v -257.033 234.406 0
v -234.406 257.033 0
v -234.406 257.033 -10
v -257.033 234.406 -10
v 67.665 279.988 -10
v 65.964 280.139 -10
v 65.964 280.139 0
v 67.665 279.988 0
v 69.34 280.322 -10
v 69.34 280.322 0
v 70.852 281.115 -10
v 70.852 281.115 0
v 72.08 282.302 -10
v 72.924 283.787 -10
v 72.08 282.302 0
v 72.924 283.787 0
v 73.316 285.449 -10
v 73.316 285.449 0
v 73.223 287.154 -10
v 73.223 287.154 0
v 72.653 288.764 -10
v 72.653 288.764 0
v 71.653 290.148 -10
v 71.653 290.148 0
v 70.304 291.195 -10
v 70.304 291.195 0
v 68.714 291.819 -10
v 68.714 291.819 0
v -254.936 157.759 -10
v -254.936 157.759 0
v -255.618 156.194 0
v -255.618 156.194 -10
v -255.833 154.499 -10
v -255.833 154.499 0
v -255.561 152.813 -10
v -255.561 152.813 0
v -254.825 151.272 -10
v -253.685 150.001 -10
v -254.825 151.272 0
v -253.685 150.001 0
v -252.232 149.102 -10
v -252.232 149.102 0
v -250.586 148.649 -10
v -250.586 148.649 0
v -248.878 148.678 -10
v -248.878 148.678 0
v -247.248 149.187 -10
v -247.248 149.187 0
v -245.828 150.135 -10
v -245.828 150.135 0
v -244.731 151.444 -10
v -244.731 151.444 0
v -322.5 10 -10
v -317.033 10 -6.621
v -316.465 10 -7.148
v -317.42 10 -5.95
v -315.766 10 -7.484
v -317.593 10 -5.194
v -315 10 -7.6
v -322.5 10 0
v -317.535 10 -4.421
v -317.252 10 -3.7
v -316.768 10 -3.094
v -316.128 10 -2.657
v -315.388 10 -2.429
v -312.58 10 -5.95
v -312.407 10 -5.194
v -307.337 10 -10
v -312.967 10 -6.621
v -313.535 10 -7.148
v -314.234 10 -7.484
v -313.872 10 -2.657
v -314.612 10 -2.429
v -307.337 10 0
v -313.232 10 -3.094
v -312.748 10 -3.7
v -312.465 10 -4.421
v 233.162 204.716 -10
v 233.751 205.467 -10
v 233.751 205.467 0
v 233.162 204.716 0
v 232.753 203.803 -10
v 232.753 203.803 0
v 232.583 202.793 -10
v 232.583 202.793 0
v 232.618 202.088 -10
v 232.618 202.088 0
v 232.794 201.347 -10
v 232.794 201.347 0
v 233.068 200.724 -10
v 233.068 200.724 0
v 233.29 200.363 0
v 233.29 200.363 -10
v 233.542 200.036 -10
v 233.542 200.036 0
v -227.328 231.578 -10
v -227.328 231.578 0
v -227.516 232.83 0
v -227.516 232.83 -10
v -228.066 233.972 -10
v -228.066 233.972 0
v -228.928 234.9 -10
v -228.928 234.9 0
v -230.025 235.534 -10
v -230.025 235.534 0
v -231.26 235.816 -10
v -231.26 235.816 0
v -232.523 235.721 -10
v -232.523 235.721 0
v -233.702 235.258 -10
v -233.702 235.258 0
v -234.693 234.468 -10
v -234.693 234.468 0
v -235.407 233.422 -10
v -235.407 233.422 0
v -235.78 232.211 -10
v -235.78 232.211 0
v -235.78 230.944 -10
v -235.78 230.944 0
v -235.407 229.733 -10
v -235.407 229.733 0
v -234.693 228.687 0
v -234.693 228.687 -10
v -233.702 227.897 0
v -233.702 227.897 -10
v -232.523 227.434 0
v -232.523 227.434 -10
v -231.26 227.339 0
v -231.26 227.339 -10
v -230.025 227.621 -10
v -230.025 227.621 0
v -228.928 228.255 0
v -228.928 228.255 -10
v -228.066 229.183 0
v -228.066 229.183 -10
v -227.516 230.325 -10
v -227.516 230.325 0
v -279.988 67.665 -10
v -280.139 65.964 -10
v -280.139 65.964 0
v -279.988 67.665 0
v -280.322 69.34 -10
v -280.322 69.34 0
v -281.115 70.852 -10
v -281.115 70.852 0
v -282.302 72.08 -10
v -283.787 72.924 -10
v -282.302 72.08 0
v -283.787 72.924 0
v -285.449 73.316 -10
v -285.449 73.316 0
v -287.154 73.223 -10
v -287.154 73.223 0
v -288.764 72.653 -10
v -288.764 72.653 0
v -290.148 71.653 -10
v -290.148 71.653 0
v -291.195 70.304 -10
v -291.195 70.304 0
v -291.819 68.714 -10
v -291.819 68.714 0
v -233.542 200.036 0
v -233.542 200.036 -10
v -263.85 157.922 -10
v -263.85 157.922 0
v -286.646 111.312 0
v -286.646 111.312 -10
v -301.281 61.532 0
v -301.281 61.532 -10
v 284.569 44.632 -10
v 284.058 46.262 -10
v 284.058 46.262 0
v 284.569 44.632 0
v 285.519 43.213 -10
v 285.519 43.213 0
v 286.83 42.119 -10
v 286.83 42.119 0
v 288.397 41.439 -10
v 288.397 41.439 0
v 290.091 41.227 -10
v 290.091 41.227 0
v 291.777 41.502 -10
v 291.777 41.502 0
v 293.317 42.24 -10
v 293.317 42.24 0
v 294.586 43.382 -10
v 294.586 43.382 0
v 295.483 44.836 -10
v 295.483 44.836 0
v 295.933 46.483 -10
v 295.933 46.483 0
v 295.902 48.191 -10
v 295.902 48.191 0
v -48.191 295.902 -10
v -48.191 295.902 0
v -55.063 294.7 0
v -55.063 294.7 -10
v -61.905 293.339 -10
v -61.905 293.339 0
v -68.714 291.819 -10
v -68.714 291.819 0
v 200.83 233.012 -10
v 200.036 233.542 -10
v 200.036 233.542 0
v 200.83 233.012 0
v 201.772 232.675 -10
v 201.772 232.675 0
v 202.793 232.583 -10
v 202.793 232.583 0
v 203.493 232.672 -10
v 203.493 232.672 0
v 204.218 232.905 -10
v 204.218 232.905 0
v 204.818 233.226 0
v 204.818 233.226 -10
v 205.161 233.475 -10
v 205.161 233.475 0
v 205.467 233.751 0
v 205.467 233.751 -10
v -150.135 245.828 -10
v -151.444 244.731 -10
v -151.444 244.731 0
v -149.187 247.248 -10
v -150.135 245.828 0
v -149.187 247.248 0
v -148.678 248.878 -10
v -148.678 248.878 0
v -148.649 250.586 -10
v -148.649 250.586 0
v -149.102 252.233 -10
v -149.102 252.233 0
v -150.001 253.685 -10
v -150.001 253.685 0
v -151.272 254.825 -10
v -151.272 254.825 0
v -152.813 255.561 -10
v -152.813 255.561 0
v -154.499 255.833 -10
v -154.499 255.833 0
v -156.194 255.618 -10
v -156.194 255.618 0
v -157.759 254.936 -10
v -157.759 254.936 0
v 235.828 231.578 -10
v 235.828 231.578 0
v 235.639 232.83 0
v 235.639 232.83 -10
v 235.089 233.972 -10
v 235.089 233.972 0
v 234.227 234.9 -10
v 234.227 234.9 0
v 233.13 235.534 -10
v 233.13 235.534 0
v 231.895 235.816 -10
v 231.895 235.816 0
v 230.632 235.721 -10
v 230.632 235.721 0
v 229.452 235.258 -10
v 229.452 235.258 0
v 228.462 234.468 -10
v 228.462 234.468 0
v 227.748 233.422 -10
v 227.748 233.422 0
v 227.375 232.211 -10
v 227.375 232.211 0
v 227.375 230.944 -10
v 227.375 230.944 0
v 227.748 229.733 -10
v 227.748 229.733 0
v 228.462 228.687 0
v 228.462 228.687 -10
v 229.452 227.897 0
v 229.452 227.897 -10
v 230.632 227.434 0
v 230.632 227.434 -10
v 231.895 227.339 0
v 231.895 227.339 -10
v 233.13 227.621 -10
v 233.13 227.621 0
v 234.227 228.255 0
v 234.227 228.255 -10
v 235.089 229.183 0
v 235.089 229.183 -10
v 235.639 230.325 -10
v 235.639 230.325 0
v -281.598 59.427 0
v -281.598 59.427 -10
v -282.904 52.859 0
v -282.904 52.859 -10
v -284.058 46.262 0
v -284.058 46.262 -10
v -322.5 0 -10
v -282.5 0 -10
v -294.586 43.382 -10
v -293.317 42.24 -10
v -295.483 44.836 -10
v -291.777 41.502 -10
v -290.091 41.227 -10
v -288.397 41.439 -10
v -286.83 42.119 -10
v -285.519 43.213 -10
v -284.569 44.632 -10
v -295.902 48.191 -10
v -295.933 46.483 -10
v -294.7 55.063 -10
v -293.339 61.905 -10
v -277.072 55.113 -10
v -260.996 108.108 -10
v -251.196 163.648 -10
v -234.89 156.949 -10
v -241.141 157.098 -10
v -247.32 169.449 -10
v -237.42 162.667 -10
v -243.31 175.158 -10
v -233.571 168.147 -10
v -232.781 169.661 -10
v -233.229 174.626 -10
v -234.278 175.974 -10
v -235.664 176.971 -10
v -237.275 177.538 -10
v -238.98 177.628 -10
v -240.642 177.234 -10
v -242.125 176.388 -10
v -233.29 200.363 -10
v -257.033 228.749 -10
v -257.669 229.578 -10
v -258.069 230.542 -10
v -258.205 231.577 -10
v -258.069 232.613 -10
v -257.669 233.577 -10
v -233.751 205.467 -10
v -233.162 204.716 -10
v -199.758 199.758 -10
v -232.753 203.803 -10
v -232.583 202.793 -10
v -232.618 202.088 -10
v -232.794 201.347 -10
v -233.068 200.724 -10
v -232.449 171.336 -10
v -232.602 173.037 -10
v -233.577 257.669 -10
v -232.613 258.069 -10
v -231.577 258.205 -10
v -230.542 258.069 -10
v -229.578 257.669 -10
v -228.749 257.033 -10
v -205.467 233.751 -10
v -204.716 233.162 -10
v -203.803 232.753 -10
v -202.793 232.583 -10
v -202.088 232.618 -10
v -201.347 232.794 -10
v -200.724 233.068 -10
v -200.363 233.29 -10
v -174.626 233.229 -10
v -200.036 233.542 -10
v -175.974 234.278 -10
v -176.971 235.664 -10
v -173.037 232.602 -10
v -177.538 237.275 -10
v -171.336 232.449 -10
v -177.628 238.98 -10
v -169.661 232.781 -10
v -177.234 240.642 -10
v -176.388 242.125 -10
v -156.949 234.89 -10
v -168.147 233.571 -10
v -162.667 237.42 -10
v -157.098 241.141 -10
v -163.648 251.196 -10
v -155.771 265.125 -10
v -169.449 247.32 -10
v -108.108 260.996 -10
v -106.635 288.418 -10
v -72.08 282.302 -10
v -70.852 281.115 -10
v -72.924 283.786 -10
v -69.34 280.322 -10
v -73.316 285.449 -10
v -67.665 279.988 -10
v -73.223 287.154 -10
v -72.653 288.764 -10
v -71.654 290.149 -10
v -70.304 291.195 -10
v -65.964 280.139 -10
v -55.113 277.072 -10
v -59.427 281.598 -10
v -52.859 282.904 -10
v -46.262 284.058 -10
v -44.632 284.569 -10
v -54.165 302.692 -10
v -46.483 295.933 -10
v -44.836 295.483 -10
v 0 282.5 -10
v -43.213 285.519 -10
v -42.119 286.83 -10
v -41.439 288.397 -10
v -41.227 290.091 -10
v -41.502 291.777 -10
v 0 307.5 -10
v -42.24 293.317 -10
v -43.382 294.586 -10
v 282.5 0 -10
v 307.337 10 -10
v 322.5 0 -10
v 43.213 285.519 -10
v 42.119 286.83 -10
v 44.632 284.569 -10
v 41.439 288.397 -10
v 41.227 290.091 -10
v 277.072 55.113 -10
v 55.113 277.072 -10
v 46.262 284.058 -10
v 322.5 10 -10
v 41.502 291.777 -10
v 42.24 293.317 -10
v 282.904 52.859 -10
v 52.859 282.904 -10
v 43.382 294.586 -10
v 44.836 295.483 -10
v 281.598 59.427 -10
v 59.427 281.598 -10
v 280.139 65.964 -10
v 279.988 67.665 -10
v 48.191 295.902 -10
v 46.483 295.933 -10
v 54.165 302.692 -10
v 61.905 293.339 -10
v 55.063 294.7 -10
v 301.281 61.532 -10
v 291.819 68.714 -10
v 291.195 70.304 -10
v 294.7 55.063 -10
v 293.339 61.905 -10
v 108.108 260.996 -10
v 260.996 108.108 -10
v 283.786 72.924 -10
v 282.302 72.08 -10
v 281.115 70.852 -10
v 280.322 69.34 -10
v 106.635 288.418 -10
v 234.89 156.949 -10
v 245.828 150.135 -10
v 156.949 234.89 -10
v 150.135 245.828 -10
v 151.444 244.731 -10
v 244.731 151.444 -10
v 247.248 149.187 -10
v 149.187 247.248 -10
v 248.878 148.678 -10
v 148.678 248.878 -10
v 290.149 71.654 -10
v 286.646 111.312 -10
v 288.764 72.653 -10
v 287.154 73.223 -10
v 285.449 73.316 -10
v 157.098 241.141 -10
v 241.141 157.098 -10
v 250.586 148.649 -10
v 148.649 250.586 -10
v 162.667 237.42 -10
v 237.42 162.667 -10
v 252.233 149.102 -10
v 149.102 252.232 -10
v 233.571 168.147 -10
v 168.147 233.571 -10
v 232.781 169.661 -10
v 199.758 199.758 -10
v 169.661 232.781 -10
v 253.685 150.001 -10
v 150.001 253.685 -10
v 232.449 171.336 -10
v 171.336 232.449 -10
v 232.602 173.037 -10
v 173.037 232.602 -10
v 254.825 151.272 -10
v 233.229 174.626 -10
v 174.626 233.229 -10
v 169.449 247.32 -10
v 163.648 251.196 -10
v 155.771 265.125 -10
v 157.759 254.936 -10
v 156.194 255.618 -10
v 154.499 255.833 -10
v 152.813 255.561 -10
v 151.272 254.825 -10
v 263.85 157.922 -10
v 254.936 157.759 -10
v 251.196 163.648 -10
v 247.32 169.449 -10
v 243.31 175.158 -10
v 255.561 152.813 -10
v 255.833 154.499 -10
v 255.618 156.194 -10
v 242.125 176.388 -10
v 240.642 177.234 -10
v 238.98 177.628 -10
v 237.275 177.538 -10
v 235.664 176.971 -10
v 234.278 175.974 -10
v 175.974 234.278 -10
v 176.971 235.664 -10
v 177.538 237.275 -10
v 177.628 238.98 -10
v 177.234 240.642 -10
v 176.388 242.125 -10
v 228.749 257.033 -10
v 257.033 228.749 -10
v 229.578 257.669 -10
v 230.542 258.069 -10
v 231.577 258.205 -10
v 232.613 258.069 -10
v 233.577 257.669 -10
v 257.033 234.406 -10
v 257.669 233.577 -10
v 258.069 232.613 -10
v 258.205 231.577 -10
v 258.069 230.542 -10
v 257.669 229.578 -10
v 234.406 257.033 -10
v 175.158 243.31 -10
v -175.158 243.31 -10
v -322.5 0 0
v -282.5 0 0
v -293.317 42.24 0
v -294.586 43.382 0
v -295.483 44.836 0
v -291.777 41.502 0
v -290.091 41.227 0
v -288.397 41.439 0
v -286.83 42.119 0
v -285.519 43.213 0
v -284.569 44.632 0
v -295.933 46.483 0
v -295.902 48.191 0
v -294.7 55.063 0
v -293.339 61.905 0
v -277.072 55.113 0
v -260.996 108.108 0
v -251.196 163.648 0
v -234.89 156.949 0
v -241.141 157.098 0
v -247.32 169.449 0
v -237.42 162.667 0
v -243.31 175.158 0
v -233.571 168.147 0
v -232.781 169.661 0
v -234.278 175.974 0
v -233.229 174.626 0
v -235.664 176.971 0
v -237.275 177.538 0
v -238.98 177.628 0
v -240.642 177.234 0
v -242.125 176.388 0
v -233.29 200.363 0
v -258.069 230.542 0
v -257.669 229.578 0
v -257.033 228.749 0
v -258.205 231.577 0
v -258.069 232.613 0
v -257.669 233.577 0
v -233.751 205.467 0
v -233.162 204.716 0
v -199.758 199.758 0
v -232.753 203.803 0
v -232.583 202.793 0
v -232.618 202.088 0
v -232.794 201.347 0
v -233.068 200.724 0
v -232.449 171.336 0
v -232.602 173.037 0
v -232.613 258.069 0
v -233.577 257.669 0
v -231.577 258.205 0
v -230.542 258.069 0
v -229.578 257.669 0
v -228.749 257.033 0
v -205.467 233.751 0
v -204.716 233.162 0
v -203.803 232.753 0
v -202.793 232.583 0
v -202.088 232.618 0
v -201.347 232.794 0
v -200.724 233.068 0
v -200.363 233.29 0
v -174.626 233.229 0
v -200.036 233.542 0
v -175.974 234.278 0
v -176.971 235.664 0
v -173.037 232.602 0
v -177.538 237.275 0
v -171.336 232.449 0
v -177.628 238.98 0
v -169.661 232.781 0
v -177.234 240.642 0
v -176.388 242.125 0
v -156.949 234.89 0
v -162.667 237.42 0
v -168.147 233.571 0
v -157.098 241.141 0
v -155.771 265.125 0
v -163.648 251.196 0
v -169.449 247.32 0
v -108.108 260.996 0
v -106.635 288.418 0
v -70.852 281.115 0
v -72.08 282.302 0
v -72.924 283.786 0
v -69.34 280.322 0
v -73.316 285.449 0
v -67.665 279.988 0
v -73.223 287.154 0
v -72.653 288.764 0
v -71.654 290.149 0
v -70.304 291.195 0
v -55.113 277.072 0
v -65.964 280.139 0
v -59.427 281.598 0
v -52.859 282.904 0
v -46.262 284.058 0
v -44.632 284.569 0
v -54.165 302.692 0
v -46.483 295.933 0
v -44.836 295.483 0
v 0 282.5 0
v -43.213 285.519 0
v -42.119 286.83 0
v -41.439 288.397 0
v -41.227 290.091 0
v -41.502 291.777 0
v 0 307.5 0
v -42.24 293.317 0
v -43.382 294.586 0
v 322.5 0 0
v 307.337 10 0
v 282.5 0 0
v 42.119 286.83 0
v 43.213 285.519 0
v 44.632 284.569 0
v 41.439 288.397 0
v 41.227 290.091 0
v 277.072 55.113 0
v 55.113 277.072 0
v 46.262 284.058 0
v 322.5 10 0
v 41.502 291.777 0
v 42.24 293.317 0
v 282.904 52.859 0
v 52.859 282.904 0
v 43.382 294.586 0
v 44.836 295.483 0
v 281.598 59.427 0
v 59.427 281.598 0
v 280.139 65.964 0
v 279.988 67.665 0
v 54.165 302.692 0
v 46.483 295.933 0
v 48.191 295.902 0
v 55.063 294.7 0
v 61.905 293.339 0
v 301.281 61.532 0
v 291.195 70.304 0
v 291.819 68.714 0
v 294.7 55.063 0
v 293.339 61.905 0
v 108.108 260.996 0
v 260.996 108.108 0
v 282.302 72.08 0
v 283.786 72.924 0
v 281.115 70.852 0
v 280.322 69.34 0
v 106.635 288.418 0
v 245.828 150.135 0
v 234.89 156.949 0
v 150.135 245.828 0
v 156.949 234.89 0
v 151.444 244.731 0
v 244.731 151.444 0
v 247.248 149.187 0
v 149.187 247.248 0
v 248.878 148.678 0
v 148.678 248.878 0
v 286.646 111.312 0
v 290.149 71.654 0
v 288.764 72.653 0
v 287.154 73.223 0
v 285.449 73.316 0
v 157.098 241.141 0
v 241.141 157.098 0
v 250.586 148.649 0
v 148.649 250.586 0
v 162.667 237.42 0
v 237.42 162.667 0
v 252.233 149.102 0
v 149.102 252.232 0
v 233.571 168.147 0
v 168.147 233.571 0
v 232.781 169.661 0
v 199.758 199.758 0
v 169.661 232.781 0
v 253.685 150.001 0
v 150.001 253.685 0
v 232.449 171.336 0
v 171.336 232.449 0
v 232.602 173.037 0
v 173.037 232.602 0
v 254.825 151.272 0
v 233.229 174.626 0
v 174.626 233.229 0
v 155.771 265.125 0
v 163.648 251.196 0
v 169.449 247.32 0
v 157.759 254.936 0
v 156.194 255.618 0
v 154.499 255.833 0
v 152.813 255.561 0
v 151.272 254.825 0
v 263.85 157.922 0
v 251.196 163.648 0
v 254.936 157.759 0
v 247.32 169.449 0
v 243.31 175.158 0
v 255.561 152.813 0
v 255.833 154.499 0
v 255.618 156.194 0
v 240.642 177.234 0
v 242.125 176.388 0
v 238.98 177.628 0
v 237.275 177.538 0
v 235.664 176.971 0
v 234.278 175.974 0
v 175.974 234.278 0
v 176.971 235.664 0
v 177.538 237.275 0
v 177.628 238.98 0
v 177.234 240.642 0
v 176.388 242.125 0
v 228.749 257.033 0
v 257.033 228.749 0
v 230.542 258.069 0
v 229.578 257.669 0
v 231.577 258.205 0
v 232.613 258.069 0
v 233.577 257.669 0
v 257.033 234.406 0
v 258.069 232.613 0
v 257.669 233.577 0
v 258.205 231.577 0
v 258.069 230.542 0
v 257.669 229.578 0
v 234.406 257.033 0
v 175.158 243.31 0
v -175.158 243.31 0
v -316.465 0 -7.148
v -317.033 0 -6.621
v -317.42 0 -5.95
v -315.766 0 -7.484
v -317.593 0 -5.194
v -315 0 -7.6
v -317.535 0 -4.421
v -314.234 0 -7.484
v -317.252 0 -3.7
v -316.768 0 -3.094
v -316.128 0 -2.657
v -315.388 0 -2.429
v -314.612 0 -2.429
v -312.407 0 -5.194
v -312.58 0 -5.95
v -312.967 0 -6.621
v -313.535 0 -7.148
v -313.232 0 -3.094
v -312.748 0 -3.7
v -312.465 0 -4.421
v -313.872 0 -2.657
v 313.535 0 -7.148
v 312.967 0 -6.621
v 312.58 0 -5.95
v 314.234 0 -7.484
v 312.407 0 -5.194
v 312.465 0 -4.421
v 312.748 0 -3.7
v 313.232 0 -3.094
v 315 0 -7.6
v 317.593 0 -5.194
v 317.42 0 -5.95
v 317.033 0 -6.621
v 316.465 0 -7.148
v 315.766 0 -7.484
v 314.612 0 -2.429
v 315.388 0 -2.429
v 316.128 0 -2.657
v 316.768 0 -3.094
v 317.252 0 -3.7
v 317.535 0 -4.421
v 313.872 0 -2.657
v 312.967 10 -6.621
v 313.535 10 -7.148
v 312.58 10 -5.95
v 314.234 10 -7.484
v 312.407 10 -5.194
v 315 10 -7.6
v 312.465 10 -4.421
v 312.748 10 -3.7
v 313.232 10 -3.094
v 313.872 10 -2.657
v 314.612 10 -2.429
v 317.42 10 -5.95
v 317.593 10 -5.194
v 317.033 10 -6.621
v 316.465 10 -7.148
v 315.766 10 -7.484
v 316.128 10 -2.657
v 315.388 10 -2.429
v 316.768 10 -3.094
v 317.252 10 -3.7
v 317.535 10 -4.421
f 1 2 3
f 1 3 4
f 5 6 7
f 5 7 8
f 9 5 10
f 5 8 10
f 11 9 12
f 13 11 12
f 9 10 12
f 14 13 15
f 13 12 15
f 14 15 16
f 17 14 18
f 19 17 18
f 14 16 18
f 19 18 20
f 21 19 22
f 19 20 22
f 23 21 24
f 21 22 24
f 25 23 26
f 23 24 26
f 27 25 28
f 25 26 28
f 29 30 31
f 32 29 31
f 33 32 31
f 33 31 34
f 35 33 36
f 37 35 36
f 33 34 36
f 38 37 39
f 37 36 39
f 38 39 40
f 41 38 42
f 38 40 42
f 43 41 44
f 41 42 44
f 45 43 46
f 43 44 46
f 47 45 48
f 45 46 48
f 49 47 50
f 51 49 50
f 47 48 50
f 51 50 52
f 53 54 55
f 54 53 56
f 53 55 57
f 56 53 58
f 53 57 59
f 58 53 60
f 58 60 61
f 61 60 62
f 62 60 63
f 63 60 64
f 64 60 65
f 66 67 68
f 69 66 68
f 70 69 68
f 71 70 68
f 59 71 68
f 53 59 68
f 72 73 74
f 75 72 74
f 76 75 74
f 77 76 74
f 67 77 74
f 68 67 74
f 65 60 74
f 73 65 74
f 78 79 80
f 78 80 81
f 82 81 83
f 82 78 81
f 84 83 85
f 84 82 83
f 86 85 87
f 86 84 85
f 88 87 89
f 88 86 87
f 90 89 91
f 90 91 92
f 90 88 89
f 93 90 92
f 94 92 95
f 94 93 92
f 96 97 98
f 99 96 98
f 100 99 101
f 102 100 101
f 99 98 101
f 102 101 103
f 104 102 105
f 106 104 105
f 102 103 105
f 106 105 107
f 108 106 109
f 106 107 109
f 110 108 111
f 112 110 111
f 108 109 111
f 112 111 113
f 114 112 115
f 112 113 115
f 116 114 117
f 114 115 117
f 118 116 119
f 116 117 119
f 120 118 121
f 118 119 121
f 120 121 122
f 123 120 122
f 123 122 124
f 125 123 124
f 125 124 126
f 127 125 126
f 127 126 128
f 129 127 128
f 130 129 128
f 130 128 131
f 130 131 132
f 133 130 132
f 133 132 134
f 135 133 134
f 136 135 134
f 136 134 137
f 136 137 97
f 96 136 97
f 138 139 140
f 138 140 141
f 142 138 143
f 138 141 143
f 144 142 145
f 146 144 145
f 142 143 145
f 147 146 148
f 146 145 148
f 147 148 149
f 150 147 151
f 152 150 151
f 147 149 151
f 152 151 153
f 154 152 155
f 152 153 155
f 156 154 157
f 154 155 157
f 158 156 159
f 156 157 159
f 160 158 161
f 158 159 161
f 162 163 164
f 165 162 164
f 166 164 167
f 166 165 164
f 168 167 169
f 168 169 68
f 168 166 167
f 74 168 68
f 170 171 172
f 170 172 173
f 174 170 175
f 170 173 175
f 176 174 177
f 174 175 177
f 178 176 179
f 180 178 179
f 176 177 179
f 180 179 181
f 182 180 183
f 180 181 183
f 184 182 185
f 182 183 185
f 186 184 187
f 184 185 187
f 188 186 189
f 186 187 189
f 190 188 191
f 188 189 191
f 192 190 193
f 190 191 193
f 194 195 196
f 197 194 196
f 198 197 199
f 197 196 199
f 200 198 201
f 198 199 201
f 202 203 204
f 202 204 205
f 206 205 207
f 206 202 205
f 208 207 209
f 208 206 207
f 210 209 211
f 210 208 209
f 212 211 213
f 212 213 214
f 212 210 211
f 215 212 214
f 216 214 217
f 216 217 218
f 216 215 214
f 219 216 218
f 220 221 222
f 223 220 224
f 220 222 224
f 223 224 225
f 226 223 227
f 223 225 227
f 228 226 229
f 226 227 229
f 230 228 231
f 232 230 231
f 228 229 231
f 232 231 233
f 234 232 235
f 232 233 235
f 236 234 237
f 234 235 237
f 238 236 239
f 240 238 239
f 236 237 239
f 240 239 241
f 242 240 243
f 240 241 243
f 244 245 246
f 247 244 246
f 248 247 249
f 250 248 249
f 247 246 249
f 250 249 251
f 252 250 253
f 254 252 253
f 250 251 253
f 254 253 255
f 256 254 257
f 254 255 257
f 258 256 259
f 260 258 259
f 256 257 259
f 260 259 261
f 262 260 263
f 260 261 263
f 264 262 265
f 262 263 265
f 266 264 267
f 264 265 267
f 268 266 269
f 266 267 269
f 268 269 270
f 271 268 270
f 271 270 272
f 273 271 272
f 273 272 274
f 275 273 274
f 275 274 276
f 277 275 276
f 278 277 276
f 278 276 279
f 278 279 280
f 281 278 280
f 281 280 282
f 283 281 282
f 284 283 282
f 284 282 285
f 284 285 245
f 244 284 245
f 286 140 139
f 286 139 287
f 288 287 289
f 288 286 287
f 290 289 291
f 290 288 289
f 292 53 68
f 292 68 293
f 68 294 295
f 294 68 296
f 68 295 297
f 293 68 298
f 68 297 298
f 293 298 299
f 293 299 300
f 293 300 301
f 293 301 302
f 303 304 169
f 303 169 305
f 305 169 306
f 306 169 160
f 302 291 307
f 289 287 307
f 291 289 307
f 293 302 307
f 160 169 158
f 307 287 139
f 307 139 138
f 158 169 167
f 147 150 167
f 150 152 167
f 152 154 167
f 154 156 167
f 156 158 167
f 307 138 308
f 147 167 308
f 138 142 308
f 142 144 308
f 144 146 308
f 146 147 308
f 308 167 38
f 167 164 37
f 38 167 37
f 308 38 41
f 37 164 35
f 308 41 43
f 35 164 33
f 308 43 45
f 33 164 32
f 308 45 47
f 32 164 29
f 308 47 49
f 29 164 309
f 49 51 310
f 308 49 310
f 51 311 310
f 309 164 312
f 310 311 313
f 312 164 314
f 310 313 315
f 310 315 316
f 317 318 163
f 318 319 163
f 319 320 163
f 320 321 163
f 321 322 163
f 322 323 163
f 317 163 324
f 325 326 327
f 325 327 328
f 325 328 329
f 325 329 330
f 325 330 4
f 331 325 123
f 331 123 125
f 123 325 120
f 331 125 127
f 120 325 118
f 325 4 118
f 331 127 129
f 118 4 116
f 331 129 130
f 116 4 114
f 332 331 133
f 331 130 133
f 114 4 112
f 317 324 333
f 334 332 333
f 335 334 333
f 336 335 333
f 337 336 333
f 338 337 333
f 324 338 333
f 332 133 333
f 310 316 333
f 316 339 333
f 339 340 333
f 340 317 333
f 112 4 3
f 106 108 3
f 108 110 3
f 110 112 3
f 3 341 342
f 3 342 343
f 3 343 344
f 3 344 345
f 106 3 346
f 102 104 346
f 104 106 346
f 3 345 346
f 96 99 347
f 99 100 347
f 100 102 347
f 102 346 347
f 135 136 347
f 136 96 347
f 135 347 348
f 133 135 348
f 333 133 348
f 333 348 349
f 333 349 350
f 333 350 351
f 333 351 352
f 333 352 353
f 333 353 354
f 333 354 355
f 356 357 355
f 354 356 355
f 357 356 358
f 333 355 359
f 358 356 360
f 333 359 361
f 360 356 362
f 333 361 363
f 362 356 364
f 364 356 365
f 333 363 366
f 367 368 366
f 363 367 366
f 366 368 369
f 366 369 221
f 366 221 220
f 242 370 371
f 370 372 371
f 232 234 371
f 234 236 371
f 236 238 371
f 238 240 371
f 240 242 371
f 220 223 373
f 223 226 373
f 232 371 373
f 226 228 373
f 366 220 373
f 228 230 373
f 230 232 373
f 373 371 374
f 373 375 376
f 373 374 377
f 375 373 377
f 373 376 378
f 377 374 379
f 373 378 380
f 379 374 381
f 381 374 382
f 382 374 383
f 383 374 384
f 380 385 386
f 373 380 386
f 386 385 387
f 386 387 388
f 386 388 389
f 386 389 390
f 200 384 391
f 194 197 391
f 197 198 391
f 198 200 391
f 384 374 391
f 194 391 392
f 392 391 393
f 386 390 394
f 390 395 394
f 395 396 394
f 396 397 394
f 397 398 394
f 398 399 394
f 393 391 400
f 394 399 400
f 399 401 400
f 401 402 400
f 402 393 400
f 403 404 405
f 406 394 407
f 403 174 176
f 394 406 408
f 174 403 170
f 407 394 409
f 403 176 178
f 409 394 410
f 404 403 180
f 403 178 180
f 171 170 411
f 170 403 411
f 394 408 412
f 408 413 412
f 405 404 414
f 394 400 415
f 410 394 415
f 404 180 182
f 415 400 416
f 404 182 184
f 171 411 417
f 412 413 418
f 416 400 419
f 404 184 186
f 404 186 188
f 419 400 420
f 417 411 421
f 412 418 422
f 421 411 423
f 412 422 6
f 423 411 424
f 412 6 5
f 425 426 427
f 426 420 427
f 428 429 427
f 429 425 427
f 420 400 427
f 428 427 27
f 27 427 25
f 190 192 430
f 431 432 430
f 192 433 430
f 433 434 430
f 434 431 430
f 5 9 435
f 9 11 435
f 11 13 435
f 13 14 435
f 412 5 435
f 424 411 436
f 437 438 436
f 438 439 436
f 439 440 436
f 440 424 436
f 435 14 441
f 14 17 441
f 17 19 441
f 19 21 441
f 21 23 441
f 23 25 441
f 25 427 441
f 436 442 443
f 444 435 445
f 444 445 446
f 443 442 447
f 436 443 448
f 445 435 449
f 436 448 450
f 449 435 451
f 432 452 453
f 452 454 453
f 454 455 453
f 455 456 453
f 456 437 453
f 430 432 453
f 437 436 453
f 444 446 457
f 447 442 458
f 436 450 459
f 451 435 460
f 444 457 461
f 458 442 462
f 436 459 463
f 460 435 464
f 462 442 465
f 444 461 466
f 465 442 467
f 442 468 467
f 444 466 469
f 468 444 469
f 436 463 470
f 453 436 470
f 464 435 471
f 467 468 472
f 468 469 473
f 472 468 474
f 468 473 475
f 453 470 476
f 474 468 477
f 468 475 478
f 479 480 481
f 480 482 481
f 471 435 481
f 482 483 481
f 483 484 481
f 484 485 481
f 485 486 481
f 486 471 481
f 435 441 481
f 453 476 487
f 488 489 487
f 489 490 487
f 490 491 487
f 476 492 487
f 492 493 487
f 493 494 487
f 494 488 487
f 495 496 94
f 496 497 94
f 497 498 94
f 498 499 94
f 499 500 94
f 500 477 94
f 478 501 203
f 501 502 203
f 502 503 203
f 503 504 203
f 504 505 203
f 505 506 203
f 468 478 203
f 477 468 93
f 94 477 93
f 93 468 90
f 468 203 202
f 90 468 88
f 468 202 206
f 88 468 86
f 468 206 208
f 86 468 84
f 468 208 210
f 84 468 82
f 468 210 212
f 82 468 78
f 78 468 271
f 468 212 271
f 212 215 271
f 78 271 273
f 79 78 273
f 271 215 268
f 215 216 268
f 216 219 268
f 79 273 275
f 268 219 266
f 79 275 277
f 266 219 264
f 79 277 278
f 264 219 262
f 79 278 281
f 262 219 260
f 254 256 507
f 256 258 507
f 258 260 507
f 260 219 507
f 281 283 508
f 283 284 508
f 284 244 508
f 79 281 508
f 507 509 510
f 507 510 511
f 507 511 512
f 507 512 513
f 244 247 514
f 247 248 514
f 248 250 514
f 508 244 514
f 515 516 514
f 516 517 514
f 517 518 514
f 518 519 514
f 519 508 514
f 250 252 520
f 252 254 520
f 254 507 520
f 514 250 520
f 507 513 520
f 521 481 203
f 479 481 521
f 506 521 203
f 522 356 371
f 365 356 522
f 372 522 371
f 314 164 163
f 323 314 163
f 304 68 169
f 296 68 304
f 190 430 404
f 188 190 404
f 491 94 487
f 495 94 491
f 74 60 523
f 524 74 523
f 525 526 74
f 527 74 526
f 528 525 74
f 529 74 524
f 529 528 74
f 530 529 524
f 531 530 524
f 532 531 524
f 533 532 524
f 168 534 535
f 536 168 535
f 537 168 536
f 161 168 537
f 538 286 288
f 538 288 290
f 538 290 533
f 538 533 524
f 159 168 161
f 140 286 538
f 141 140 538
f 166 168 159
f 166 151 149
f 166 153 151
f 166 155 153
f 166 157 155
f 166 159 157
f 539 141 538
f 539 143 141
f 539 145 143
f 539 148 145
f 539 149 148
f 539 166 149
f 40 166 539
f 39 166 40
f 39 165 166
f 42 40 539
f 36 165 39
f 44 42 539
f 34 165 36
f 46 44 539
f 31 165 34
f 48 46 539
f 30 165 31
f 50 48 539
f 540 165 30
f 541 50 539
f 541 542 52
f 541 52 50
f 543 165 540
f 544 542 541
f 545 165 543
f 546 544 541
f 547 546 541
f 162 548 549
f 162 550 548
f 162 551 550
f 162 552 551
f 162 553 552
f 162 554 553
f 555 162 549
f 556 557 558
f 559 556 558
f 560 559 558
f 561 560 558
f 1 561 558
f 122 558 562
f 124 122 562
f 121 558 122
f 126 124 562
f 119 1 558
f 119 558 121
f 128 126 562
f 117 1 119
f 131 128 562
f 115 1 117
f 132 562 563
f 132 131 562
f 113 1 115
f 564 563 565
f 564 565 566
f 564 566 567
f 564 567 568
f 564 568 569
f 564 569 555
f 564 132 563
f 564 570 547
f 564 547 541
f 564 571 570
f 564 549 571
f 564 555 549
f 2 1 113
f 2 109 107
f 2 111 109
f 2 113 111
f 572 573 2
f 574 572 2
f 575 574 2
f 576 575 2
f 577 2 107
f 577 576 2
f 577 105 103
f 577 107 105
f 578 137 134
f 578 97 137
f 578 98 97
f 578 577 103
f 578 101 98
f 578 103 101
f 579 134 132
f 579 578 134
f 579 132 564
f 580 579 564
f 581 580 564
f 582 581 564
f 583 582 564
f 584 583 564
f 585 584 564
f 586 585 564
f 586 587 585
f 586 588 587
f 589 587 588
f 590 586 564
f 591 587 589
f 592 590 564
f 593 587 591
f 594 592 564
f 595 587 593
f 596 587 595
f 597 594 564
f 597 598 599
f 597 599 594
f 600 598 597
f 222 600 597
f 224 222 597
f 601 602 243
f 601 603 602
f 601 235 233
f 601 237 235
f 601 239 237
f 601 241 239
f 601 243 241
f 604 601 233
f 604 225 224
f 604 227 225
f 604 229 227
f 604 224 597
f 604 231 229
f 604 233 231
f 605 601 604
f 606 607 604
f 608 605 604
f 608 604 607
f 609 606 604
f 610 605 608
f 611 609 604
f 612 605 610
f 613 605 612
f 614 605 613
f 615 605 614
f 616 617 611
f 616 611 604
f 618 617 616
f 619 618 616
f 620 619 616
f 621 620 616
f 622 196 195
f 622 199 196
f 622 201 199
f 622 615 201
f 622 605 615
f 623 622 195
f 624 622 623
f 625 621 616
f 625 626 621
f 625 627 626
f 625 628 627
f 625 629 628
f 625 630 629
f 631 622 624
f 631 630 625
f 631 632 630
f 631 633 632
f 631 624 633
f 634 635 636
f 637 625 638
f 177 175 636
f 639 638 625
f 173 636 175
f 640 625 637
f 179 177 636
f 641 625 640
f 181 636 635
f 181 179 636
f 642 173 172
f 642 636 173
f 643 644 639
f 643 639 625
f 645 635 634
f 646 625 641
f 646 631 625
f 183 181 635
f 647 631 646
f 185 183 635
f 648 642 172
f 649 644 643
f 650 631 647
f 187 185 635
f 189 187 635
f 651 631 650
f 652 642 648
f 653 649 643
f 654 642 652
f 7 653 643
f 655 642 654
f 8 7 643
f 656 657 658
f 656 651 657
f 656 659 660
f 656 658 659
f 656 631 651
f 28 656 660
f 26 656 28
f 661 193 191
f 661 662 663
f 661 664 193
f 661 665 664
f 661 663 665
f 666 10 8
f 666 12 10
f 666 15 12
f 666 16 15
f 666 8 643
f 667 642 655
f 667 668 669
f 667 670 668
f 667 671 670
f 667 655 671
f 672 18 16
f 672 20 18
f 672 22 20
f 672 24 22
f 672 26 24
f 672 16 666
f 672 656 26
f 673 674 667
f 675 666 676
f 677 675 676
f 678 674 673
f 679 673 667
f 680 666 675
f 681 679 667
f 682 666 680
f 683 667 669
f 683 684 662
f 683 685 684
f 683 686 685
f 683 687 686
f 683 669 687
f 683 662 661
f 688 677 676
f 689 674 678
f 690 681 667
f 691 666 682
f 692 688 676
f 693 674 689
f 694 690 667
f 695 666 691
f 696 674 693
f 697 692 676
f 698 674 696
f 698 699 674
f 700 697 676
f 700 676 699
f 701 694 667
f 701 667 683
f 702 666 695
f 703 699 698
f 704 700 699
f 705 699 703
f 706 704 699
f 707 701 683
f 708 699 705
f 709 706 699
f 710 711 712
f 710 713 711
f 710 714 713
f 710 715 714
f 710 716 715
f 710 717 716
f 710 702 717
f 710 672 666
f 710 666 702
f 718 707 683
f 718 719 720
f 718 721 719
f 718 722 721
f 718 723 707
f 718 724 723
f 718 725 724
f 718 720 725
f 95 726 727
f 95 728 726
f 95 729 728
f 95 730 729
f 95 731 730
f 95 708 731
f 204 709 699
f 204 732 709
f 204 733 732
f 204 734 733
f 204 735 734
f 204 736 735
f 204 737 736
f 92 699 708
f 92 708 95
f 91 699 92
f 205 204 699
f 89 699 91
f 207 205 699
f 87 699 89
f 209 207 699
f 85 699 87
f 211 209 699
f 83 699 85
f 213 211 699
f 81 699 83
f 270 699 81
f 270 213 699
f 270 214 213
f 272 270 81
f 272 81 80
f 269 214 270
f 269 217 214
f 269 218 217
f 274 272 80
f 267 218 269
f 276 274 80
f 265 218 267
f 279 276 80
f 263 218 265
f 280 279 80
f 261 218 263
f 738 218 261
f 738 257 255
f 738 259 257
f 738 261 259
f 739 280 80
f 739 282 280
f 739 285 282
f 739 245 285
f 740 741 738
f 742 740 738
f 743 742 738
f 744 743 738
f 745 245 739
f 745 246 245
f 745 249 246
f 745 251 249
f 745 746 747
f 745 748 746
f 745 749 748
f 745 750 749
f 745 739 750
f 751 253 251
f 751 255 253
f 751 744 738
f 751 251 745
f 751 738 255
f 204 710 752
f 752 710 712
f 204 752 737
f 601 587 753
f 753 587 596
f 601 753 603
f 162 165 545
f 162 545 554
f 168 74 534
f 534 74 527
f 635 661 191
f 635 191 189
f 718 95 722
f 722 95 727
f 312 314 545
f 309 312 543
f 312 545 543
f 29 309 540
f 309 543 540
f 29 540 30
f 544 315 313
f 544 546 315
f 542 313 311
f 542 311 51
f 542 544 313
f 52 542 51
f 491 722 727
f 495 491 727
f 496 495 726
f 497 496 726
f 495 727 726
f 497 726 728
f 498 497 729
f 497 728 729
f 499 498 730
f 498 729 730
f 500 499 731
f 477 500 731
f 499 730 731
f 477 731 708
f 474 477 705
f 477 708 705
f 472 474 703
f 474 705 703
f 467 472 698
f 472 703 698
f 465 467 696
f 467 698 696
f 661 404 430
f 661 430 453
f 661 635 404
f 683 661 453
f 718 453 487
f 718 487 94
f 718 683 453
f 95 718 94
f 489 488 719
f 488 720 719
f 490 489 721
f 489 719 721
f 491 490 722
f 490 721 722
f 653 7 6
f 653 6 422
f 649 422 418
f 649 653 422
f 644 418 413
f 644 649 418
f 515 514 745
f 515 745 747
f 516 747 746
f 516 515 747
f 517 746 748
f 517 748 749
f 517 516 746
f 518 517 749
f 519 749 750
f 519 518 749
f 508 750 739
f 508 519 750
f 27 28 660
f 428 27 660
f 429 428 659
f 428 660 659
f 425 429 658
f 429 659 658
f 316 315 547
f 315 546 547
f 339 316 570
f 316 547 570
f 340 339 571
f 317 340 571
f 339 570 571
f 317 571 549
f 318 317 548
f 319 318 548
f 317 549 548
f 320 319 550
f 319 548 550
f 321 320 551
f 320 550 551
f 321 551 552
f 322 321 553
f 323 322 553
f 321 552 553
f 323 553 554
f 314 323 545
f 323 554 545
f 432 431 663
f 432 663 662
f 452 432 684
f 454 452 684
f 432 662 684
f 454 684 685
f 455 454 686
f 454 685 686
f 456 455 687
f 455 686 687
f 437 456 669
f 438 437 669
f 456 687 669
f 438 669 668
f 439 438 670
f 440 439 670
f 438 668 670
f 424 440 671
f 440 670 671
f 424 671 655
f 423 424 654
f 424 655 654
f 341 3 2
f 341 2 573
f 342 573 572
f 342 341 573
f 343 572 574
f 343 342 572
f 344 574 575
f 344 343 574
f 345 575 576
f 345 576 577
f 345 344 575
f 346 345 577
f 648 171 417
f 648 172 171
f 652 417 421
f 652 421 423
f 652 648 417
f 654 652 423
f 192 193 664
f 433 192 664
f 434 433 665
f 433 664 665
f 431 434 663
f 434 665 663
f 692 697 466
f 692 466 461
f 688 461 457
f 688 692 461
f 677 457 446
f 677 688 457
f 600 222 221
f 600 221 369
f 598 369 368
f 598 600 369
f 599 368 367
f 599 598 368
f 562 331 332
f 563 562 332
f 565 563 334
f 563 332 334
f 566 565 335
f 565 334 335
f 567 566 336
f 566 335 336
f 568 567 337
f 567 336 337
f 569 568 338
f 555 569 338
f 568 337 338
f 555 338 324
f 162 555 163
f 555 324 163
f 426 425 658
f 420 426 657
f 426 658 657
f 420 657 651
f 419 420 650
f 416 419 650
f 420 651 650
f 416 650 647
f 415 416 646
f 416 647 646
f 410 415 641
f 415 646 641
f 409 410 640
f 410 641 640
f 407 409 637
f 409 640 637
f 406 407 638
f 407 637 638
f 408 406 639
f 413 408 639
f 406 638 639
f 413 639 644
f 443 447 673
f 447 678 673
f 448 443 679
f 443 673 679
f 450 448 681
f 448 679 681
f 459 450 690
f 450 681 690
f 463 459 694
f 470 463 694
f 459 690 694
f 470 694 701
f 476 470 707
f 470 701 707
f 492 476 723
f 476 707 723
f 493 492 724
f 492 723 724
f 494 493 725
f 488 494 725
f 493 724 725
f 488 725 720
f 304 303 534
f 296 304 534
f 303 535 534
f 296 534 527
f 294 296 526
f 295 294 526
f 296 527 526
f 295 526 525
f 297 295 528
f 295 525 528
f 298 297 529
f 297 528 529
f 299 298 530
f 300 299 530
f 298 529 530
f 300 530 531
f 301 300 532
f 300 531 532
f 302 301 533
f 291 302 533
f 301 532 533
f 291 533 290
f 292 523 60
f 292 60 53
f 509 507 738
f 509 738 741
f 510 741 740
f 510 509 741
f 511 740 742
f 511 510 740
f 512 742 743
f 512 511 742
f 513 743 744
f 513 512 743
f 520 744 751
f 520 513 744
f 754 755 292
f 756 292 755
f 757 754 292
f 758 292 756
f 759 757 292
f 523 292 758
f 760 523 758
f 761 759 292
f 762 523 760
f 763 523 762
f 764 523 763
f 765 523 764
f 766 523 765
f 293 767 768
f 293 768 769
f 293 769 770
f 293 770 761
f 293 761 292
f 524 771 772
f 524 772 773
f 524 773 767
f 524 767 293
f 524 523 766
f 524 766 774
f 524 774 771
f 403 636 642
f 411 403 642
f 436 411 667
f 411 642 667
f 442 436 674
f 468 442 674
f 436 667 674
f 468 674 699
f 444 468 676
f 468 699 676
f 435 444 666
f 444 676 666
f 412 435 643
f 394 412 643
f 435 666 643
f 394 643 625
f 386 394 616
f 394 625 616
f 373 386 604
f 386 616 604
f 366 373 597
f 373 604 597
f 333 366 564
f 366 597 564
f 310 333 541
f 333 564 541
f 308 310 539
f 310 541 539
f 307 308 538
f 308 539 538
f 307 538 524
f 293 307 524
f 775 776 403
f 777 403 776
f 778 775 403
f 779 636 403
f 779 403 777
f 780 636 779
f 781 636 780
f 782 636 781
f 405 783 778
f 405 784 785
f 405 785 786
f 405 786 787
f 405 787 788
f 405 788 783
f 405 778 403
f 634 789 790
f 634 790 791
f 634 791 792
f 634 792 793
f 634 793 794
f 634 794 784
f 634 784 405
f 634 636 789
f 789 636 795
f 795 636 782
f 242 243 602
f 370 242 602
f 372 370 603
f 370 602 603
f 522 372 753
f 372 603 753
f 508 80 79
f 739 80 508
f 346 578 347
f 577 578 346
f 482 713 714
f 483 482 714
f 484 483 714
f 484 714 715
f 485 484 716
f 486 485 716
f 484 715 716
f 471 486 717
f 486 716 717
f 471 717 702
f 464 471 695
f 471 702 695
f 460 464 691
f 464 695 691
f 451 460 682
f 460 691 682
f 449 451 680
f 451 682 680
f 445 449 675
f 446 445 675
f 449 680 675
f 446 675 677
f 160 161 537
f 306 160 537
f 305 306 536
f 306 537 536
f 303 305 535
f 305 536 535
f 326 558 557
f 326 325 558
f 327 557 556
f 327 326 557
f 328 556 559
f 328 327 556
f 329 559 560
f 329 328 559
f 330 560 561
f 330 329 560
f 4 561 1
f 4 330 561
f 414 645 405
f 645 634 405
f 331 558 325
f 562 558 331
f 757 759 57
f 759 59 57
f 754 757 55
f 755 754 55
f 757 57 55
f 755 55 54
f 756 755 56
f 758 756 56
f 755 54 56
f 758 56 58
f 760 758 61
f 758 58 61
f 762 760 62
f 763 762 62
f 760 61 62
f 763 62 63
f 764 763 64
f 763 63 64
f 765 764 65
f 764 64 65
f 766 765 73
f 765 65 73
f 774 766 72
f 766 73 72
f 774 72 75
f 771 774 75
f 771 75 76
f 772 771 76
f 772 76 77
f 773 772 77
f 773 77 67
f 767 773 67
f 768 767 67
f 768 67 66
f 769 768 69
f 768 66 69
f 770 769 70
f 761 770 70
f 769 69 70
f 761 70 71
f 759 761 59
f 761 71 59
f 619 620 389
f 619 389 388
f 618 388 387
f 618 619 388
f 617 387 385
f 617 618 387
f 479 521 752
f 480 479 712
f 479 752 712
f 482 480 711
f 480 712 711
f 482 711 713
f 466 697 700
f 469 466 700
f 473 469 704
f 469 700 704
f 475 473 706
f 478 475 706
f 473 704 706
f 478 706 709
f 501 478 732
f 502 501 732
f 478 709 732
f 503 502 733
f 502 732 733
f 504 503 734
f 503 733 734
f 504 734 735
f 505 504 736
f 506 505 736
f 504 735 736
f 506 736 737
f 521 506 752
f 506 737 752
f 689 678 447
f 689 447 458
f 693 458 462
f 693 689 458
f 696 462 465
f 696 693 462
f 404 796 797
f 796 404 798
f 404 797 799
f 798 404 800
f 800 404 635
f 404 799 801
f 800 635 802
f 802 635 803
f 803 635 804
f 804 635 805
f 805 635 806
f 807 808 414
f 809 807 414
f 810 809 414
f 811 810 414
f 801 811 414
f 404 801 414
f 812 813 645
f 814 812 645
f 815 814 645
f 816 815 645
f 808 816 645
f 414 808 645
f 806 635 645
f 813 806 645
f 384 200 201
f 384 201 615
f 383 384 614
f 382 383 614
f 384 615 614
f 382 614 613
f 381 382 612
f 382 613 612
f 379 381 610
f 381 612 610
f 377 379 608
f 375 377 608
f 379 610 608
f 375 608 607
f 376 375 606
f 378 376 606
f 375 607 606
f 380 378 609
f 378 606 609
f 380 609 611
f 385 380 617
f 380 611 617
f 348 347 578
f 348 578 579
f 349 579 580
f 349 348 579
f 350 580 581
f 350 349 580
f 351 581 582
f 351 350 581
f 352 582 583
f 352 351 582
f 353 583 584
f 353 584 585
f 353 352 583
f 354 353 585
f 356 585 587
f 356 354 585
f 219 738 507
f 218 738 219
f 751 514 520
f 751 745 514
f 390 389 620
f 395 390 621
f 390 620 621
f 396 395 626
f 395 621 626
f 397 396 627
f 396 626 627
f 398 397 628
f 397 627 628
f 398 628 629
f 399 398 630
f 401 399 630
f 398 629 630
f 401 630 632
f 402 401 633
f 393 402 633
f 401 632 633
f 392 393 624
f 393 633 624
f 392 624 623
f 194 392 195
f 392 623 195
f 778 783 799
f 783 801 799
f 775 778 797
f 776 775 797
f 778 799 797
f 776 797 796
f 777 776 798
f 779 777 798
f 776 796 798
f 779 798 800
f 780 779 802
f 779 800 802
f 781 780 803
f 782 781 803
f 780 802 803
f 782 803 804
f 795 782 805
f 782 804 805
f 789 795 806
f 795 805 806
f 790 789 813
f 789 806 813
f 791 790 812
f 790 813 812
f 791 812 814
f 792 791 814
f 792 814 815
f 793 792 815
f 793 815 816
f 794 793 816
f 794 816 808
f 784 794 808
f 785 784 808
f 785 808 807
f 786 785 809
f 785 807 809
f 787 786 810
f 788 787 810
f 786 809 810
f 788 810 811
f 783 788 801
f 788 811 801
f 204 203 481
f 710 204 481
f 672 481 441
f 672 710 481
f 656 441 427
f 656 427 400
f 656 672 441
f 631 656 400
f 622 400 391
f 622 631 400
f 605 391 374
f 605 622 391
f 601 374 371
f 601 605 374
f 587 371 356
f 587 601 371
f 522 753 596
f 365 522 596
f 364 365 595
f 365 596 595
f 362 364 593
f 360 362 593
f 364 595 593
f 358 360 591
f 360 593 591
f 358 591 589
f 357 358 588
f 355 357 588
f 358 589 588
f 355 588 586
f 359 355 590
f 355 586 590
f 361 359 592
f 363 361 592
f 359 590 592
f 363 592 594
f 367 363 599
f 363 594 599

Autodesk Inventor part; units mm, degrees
ref_plane "YZ Plane" through (0, 0, 0) normal (1, 0, 0) x (0, 1, 0)
ref_plane "XZ Plane" through (0, 0, 0) normal (0, 1, 0) x (-1, 0, 0)
ref_plane "XY Plane" through (0, 0, 0) normal (0, 0, 1) x (1, 0, 0)
sketch "Sketch7" plane through (0, 0, 0) normal (0, 0, 1) x (1, 0, 0)
  circle A0 centre (-231.5775, 231.5775) radius 4.25
  line L0 (-231.5775, 203.2932) -> (-203.2932, 231.5775)
  line L1 (-203.2932, 231.5775) -> (-231.5775, 259.8617)
  line L2 (-231.5775, 259.8617) -> (-259.8617, 231.5775)
  line L3 (-259.8617, 231.5775) -> (-231.5775, 203.2932)
  line L4 (-231.5775, 203.2932) -> (-231.5775, 259.8617) construction
  line L5 (-203.2932, 231.5775) -> (-259.8617, 231.5775) construction
  line L6 (-231.5775, 203.2932) -> (-191.5775, 203.2932) construction
  arc A1 (289.9795, 47.2262) -> (285.9788, 67.3391) centre (0, 0) ccw construction
  arc A2 (295.9015, 48.1906) -> (291.8191, 68.7143) centre (0, 0) ccw
  arc A3 (284.0576, 46.2617) -> (280.1386, 65.9639) centre (0, 0) ccw
  arc A4 (284.0576, 46.2617) -> (295.9015, 48.1906) centre (289.9795, 47.2262) ccw
  arc A5 (291.8191, 68.7143) -> (280.1386, 65.9639) centre (285.9788, 67.3391) ccw
  line L7 (0, 0) -> (289.9795, 47.2262) construction
  line L8 (0, 0) -> (293.8, 0) construction
  line L9 (0, 0) -> (285.9788, 67.3391) construction
  circle A6 centre (0, 0) radius 307.5
  circle A7 centre (0, 0) radius 282.5
  line L10 (-203.2932, 231.5775) -> (-185.1143, 213.3986)
  line L11 (-231.5775, 203.2932) -> (-213.3986, 185.1143)
  line L12 (-307.5, 0) -> (0, 0)
  line L13 (0, 0) -> (307.5, 0)
  line L14 (-231.5775, -203.2932) -> (-259.8617, -231.5775)
  line L15 (-259.8617, -231.5775) -> (-231.5775, -259.8617)
  circle A8 centre (-231.5775, -231.5775) radius 4.25
  line L16 (-231.5775, -259.8617) -> (-203.2932, -231.5775)
  line L17 (-203.2932, -231.5775) -> (-231.5775, -203.2932)
  line L18 (-203.2932, -231.5775) -> (-185.1143, -213.3986)
  line L19 (-231.5775, -203.2932) -> (-213.3986, -185.1143)
  line L20 (203.2932, -231.5775) -> (231.5775, -259.8617)
  line L21 (231.5775, -259.8617) -> (259.8617, -231.5775)
  circle A9 centre (231.5775, -231.5775) radius 4.25
  line L22 (259.8617, -231.5775) -> (231.5775, -203.2932)
  line L23 (231.5775, -203.2932) -> (203.2932, -231.5775)
  line L24 (231.5775, -203.2932) -> (213.3986, -185.1143)
  line L25 (203.2932, -231.5775) -> (185.1143, -213.3986)
  line L26 (231.5775, 203.2932) -> (259.8617, 231.5775)
  line L27 (259.8617, 231.5775) -> (231.5775, 259.8617)
  circle A10 centre (231.5775, 231.5775) radius 4.25
  line L28 (231.5775, 259.8617) -> (203.2932, 231.5775)
  line L29 (203.2932, 231.5775) -> (231.5775, 203.2932)
  line L30 (203.2932, 231.5775) -> (185.1143, 213.3986)
  line L31 (231.5775, 203.2932) -> (213.3986, 185.1143)
  arc A11 (254.9356, 157.7589) -> (243.3099, 175.158) centre (0, 0) ccw
  arc A12 (243.3099, 175.158) -> (233.571, 168.1471) centre (238.4404, 171.6526) ccw
  arc A13 (244.7314, 151.4444) -> (233.571, 168.1471) centre (0, 0) ccw
  arc A14 (244.7314, 151.4444) -> (254.9356, 157.7589) centre (249.8335, 154.6017) ccw
  arc A15 (175.158, 243.3099) -> (157.7589, 254.9356) centre (0, 0) ccw
  arc A16 (157.7589, 254.9356) -> (151.4444, 244.7314) centre (154.6017, 249.8335) ccw
  arc A17 (168.1471, 233.571) -> (151.4444, 244.7314) centre (0, 0) ccw
  arc A18 (168.1471, 233.571) -> (175.158, 243.3099) centre (171.6526, 238.4404) ccw
  arc A19 (68.7143, 291.8191) -> (48.1906, 295.9015) centre (0, 0) ccw
  arc A20 (48.1906, 295.9015) -> (46.2617, 284.0576) centre (47.2262, 289.9795) ccw
  arc A21 (65.9639, 280.1386) -> (46.2617, 284.0576) centre (0, 0) ccw
  arc A22 (65.9639, 280.1386) -> (68.7143, 291.8191) centre (67.3391, 285.9788) ccw
  arc A23 (-48.1906, 295.9015) -> (-68.7143, 291.8191) centre (0, 0) ccw
  arc A24 (-68.7143, 291.8191) -> (-65.9639, 280.1386) centre (-67.3391, 285.9788) ccw
  arc A25 (-46.2617, 284.0576) -> (-65.9639, 280.1386) centre (0, 0) ccw
  arc A26 (-46.2617, 284.0576) -> (-48.1906, 295.9015) centre (-47.2262, 289.9795) ccw
  arc A27 (-157.7589, 254.9356) -> (-175.158, 243.3099) centre (0, 0) ccw
  arc A28 (-175.158, 243.3099) -> (-168.1471, 233.571) centre (-171.6526, 238.4404) ccw
  arc A29 (-151.4444, 244.7314) -> (-168.1471, 233.571) centre (0, 0) ccw
  arc A30 (-151.4444, 244.7314) -> (-157.7589, 254.9356) centre (-154.6017, 249.8335) ccw
  arc A31 (-243.3099, 175.158) -> (-254.9356, 157.7589) centre (0, 0) ccw
  arc A32 (-254.9356, 157.7589) -> (-244.7314, 151.4444) centre (-249.8335, 154.6017) ccw
  arc A33 (-233.571, 168.1471) -> (-244.7314, 151.4444) centre (0, 0) ccw
  arc A34 (-233.571, 168.1471) -> (-243.3099, 175.158) centre (-238.4404, 171.6526) ccw
  arc A35 (-291.8191, 68.7143) -> (-295.9015, 48.1906) centre (0, 0) ccw
  arc A36 (-295.9015, 48.1906) -> (-284.0576, 46.2617) centre (-289.9795, 47.2262) ccw
  arc A37 (-280.1386, 65.9639) -> (-284.0576, 46.2617) centre (0, 0) ccw
  arc A38 (-280.1386, 65.9639) -> (-291.8191, 68.7143) centre (-285.9788, 67.3391) ccw
  arc A39 (-295.9015, -48.1906) -> (-291.8191, -68.7143) centre (0, 0) ccw
  arc A40 (-291.8191, -68.7143) -> (-280.1386, -65.9639) centre (-285.9788, -67.3391) ccw
  arc A41 (-284.0576, -46.2617) -> (-280.1386, -65.9639) centre (0, 0) ccw
  arc A42 (-284.0576, -46.2617) -> (-295.9015, -48.1906) centre (-289.9795, -47.2262) ccw
  arc A43 (-254.9356, -157.7589) -> (-243.3099, -175.158) centre (0, 0) ccw
  arc A44 (-243.3099, -175.158) -> (-233.571, -168.1471) centre (-238.4404, -171.6526) ccw
  arc A45 (-244.7314, -151.4444) -> (-233.571, -168.1471) centre (0, 0) ccw
  arc A46 (-244.7314, -151.4444) -> (-254.9356, -157.7589) centre (-249.8335, -154.6017) ccw
  arc A47 (-175.158, -243.3099) -> (-157.7589, -254.9356) centre (0, 0) ccw
  arc A48 (-157.7589, -254.9356) -> (-151.4444, -244.7314) centre (-154.6017, -249.8335) ccw
  arc A49 (-168.1471, -233.571) -> (-151.4444, -244.7314) centre (0, 0) ccw
  arc A50 (-168.1471, -233.571) -> (-175.158, -243.3099) centre (-171.6526, -238.4404) ccw
  arc A51 (-68.7143, -291.8191) -> (-48.1906, -295.9015) centre (0, 0) ccw
  arc A52 (-48.1906, -295.9015) -> (-46.2617, -284.0576) centre (-47.2262, -289.9795) ccw
  arc A53 (-65.9639, -280.1386) -> (-46.2617, -284.0576) centre (0, 0) ccw
  arc A54 (-65.9639, -280.1386) -> (-68.7143, -291.8191) centre (-67.3391, -285.9788) ccw
  arc A55 (48.1906, -295.9015) -> (68.7143, -291.8191) centre (0, 0) ccw
  arc A56 (68.7143, -291.8191) -> (65.9639, -280.1386) centre (67.3391, -285.9788) ccw
  arc A57 (46.2617, -284.0576) -> (65.9639, -280.1386) centre (0, 0) ccw
  arc A58 (46.2617, -284.0576) -> (48.1906, -295.9015) centre (47.2262, -289.9795) ccw
  arc A59 (157.7589, -254.9356) -> (175.158, -243.3099) centre (0, 0) ccw
  arc A60 (175.158, -243.3099) -> (168.1471, -233.571) centre (171.6526, -238.4404) ccw
  arc A61 (151.4444, -244.7314) -> (168.1471, -233.571) centre (0, 0) ccw
  arc A62 (151.4444, -244.7314) -> (157.7589, -254.9356) centre (154.6017, -249.8335) ccw
  arc A63 (243.3099, -175.158) -> (254.9356, -157.7589) centre (0, 0) ccw
  arc A64 (254.9356, -157.7589) -> (244.7314, -151.4444) centre (249.8335, -154.6017) ccw
  arc A65 (233.571, -168.1471) -> (244.7314, -151.4444) centre (0, 0) ccw
  arc A66 (233.571, -168.1471) -> (243.3099, -175.158) centre (238.4404, -171.6526) ccw
  arc A67 (291.8191, -68.7143) -> (295.9015, -48.1906) centre (0, 0) ccw
  arc A68 (295.9015, -48.1906) -> (284.0576, -46.2617) centre (289.9795, -47.2262) ccw
  arc A69 (280.1386, -65.9639) -> (284.0576, -46.2617) centre (0, 0) ccw
  arc A70 (280.1386, -65.9639) -> (291.8191, -68.7143) centre (285.9788, -67.3391) ccw
  point P0 (-202.8328, 231.1171)
  point P1 (-231.1171, 202.8328)
  point P2 (-282.5, 0)
  point P3 (282.5, 0)
  point P4 (231.1171, 202.8328)
  point P5 (202.8328, 231.1171)
  dimension "d131" = 8.5
  dimension "d132" = 231.5775
  dimension "d133" = 231.5775
  dimension "d135" = 45
  dimension "d137" = 40
  dimension "d138" = 40
  dimension "d144" = 293.8
  dimension "d145" = 9.25
  dimension "d146" = 4
  dimension "d147" = 12
  dimension "d148" = 615
  dimension "d149" = 565
  dimension "d152" = 360
  dimension "d156" = 360
extrude "Extrusion11" add sketch "Sketch7" against normal blind 10 contours L3 L2 L1 L0 | L0 A6 L11 | L0 L10 A6 | A6 L10 A7 L11 | L11 A7 L12 A6 | A6 L30 A7 L10 | L30 L29 A6 | A6 L31 A7 L30 | L29 L31 A6 | L29 L28 L27 L26 | A6 L13 A7 L31
sketch "Sketch8" plane through (-307.5, 0, 0) normal (0, -1, 0) x (1, 0, 0)
  line L0 (25, 0) -> (590, 0) projected
  line L1 (25, 0) -> (-15, 0)
  line L2 (-15, 0) -> (-15, -10)
  line L3 (-15, -10) -> (25, -10)
  line L4 (25, -10) -> (25, 0)
  circle A0 centre (-7.5, -5) radius 2.6
  line L5 (590, 0) -> (630, 0)
  line L6 (630, 0) -> (630, -10)
  line L7 (630, -10) -> (590, -10)
  line L8 (590, -10) -> (590, 0)
  circle A1 centre (622.5, -5) radius 2.6
  dimension "d160" = 40
  dimension "d161" = 10
  dimension "d162" = 5.2
  dimension "d163" = 5
  dimension "d164" = 7.5
  dimension "d165" = 40
  dimension "d166" = 10
  dimension "d167" = 5.2
  dimension "d168" = 7.5
  dimension "d169" = 5
extrude "Extrusion12" add sketch "Sketch8" against normal blind 10 contours L5 L6 L7 L8 | L4 L3 L2 L1 | A0 | A1
fillet "Fillet4" radius 4 8 edges at (-231.1171, 202.8328, -5) (-259.8617, 231.5775, -5) (-202.8328, 231.1171, -5) (-231.5775, 259.8617, -5) (231.5775, 259.8617, -5) (259.8617, 231.5775, -5) (202.8328, 231.1171, -5) (231.1171, 202.8328, -5)
hole "Hole6" at (-315, 0, -5) at (315, 0, -5) direction (0, 1, 0) diameter 5.2 end through all
equation "\"bar_screw_hole_diam\" = 8.5"
equation "\"foot_length\" = 15"
equation "\"tube_rim_diam\" = 605"
equation "\"tube_inner_diam\" = 541"
equation "\"tube_outer_diam\" = 561"
equation "\"ring_delta\" = 2"
equation "\"bar_delta\" = 5"
equation "\"bar_circle_diam\" = 655"
equation "\"ring_inner_diam\" = 565"
equation "\"ring_outer_diam\" = 615"
equation "\"slot_angle\" = 9.25deg"
equation "\"slot_diam\" = 12"
equation "\"slots_circle_diam\" = 587.6"
equation "\"foot_screw_diam\" = 5.2"
equation "\"bar_fillet\" = 4"
properties part number "half_ring_1" material "Aluminum 6061"
